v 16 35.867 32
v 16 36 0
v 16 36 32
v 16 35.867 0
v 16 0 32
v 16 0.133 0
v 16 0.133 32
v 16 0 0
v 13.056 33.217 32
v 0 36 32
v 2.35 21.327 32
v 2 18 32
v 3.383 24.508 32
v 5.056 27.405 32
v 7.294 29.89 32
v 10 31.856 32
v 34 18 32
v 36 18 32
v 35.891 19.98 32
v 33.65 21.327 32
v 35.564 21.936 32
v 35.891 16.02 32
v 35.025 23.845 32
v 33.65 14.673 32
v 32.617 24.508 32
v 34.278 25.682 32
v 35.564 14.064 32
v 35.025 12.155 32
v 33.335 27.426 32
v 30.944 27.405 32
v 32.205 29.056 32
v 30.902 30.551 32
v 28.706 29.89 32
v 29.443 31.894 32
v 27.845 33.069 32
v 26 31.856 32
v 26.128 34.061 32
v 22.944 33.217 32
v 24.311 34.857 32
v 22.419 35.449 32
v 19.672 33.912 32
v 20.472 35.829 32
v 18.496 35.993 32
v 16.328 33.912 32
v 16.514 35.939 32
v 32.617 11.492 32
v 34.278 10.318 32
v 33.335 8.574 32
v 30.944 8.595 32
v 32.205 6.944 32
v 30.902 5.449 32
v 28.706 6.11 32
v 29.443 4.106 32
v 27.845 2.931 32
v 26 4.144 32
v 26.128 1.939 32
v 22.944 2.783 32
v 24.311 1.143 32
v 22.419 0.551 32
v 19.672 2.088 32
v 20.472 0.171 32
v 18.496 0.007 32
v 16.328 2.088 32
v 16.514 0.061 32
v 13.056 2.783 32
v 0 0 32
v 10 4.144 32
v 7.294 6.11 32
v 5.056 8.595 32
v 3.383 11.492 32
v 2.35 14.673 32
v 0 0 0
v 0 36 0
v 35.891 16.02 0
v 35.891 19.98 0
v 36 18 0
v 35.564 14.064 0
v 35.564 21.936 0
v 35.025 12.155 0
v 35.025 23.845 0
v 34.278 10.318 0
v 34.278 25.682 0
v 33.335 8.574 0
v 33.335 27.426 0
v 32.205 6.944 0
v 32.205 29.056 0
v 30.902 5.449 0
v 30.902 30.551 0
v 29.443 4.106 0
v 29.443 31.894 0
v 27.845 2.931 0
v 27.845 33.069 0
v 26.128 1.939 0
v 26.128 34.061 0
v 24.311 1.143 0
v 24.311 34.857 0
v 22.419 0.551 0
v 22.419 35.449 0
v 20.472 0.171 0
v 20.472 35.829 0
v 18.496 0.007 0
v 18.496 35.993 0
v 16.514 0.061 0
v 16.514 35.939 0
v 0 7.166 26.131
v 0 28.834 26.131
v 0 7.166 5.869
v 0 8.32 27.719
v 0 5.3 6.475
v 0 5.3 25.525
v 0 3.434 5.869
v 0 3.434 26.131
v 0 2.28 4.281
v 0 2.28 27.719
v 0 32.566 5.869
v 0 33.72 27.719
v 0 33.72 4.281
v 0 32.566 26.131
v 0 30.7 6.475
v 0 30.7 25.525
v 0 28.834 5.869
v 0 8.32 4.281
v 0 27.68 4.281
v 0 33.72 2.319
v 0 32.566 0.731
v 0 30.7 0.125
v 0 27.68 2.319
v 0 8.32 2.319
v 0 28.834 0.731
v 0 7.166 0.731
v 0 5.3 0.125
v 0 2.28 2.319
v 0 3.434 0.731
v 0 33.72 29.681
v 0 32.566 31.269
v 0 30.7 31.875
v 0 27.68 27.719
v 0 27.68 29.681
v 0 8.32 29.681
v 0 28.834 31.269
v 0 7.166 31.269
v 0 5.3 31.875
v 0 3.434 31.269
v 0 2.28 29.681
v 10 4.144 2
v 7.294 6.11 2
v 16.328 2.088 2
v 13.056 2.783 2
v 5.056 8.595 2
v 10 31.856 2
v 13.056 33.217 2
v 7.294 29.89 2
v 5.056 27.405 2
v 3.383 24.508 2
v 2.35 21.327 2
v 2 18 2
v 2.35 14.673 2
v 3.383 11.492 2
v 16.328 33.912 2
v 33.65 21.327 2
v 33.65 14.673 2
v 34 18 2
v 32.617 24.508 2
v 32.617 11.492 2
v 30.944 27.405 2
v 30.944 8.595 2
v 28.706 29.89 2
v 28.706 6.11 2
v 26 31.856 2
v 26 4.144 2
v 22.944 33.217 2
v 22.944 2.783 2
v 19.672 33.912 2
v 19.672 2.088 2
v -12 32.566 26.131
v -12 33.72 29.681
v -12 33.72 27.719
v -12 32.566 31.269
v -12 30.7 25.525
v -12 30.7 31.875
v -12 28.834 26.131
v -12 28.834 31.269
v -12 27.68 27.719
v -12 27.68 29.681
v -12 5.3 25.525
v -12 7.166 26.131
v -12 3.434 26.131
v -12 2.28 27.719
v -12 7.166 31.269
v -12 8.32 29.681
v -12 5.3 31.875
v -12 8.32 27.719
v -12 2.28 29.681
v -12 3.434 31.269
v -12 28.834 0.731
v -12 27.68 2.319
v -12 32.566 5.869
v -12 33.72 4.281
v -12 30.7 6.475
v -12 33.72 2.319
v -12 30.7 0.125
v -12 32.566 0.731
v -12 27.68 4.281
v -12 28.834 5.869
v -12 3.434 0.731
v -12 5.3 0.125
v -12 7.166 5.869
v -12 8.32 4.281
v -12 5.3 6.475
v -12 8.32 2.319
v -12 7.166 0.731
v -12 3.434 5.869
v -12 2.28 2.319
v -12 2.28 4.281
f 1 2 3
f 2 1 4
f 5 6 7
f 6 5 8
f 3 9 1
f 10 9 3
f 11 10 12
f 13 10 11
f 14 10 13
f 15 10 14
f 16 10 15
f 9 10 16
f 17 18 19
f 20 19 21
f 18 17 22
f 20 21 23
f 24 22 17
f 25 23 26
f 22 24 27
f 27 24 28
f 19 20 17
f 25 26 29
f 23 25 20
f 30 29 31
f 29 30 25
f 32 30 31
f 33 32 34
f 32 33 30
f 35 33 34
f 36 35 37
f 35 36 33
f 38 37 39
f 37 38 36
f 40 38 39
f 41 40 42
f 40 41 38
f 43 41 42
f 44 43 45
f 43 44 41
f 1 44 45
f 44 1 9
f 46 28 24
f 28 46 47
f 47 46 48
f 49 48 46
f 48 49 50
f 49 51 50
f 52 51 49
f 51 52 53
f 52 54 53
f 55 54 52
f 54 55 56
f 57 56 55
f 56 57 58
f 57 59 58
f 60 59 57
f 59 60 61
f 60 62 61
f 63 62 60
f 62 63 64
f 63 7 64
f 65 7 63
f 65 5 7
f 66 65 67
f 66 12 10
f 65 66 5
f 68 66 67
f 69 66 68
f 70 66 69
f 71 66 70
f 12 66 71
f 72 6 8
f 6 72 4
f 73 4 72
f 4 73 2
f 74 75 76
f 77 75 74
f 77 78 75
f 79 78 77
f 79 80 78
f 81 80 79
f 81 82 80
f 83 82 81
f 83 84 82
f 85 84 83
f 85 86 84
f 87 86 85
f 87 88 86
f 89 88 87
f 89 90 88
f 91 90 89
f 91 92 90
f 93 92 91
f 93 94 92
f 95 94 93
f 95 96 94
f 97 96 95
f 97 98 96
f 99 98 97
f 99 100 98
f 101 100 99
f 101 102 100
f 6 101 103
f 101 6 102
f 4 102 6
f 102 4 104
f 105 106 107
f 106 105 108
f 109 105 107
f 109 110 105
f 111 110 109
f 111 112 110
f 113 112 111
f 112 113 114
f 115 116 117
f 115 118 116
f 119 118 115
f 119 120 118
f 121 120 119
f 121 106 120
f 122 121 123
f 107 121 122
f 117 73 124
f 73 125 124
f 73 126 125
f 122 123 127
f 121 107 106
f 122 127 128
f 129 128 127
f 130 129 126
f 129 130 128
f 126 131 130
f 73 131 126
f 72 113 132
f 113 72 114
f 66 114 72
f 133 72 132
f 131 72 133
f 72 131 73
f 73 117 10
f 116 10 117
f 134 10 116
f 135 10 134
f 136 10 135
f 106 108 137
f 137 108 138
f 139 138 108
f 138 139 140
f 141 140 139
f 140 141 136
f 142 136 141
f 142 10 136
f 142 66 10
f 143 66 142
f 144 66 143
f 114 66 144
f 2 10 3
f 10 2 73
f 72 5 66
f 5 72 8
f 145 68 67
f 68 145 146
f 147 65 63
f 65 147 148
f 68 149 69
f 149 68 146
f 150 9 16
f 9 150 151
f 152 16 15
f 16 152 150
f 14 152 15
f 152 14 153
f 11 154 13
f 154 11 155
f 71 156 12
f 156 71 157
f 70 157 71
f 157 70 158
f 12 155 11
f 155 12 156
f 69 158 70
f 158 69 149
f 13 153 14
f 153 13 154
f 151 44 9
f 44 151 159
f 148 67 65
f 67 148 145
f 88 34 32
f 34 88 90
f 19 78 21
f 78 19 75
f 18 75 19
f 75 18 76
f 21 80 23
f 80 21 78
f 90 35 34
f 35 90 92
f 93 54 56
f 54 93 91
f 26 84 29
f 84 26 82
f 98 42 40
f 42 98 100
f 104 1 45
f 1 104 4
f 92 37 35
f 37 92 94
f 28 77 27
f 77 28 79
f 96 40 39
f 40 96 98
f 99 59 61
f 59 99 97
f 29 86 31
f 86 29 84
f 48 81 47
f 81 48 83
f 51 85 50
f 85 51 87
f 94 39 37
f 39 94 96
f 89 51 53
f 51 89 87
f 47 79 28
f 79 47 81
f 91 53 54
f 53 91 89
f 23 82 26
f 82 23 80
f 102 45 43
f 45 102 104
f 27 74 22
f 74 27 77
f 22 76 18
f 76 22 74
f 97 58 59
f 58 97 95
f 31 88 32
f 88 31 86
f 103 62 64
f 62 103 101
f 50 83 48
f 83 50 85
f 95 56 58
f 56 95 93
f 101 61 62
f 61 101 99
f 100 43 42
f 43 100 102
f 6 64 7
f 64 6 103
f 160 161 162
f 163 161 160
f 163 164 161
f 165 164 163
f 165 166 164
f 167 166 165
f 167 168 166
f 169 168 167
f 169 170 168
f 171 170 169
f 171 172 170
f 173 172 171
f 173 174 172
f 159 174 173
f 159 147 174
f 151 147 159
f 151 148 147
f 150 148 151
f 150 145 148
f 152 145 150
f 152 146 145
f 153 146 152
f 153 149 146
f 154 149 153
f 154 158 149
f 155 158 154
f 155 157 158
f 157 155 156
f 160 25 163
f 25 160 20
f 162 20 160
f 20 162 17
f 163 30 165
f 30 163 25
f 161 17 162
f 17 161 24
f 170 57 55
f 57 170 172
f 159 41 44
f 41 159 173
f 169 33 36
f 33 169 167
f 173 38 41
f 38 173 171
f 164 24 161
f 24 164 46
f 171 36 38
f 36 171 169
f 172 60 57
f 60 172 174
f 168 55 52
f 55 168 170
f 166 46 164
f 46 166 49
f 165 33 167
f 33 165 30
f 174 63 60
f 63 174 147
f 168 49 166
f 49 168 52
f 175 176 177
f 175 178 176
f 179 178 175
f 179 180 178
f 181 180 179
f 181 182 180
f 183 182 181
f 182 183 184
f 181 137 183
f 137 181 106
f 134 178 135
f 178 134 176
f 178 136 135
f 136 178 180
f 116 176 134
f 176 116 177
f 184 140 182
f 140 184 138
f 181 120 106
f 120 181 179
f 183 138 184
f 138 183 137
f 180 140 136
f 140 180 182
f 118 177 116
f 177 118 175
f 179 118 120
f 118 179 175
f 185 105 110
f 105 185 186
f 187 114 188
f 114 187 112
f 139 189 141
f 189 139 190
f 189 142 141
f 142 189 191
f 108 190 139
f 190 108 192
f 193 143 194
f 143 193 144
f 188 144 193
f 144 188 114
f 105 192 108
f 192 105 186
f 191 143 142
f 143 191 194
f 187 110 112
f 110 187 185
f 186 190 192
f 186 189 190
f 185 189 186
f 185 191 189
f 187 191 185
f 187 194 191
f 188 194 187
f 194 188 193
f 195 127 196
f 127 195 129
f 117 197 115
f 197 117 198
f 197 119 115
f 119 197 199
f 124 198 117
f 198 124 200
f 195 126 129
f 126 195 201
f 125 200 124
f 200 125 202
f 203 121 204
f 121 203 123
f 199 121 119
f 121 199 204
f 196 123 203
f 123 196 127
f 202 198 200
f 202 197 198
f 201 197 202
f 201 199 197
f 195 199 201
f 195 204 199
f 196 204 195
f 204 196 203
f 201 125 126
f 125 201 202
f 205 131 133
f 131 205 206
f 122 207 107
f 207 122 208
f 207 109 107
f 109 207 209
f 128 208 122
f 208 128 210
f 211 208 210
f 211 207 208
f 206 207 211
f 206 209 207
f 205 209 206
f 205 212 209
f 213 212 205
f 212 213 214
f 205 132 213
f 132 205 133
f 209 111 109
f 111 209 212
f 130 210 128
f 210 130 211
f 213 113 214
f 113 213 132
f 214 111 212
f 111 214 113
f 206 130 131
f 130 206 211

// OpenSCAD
////////////////////////////////////////////////////////////////////////////
// Manhattan Pegboard Collection v1 : 4 Peg Bin Rounded
// designed in NYC by Matt Manhattan (mattmanhattan.com)
////////////////////////////////////////////////////////////////////////////

// These parameters create the INTERIOR size of your bin (in mm)

width = 32;  // This is the DIAMETER of the cylinder cutout -- MINIMUM is '28' for 2 rows of pegs
depth = width; // This is the depth of the shelf
height = 32; // This is the height of the shelf -- MINIMUM is '32' for 2 rows of pegs
thickness = 2; // This is the thickness of the shelf
pegs = 1; // span between pegs [0 = centered (one peg // 1 = 2 pegs // 2 = 3 pegs // 3 = 4 pegs]

// leave this alone - it alters the center point of the model
centerequals = false; 
///////////////////

//////////////////////////////////////////////////////////////////
// Rounded Pegboard Bin
//////////////////////////////////////////////////////////////////

 difference()
    {
        // this generates the rear cube which attaches to the pegs
        cube ([((depth/2)),width+(thickness*2),height]); 
       
        translate([midpointY,midpointY,0])
        {
            
            cylinder (height,d=(width),centerequals);  
        }
    }
        
difference()
    {
      translate([midpointY,midpointY,0])
        {
            
            cylinder ($fa=1,height,d=(width+(thickness*2)),centerequals);  // exterior circle shape
        }  
        
      translate([midpointY,midpointY,thickness]) // if you change 'thickness' to '0' you will remove the base of your bin which can be useful for tools
        {
            
            cylinder (height,d=width,centerequals);  // interior circle shape
        }
    }    

//////////////////////////////////////////////////////////////////
// Pegboard Pegs
//////////////////////////////////////////////////////////////////   

pegCenterToCenterDistance = 25.4; 	    // 1 inch spacing
pegDiameter = 6.35; 					// 1/4 inch peg holes
pegLength = 12;                         // length of the pegs
midpointY = (width+(thickness*2))/2;
midpointZ = height/2;

// PEG 1
// this rotates the peg 90 degrees
rotate([0,-90,0])
    {    
    translate([(midpointZ+((pegCenterToCenterDistance/2))),(midpointY+((pegCenterToCenterDistance/2)*pegs)),0])    // moves PEG 1 to its position
        { 
        cylinder(h=pegLength, r=(pegDiameter/2), center=centerequals);  // PEG 1 (top left)
        }
        
    translate([(midpointZ+((pegCenterToCenterDistance/2))),(midpointY-((pegCenterToCenterDistance/2)*pegs)),0])    // moves PEG 2 to its position
        {    
        cylinder(h=pegLength, r=(pegDiameter/2), center=centerequals); // PEG 2 (top right)
        }
        
    translate([(midpointZ-((pegCenterToCenterDistance/2))),(midpointY+((pegCenterToCenterDistance/2)*pegs)),0])    // moves PEG 3 to its position
        { 
        cylinder(h=pegLength, r=(pegDiameter/2), center=centerequals);  // PEG 3 (bottom left)
        }
        
    translate([(midpointZ-((pegCenterToCenterDistance/2))),(midpointY-((pegCenterToCenterDistance/2)*pegs)),0])    // moves PEG 4 to its position
        {    
        cylinder(h=pegLength, r=(pegDiameter/2), center=centerequals); // PEG 4 (bottom right)
        }
    }
